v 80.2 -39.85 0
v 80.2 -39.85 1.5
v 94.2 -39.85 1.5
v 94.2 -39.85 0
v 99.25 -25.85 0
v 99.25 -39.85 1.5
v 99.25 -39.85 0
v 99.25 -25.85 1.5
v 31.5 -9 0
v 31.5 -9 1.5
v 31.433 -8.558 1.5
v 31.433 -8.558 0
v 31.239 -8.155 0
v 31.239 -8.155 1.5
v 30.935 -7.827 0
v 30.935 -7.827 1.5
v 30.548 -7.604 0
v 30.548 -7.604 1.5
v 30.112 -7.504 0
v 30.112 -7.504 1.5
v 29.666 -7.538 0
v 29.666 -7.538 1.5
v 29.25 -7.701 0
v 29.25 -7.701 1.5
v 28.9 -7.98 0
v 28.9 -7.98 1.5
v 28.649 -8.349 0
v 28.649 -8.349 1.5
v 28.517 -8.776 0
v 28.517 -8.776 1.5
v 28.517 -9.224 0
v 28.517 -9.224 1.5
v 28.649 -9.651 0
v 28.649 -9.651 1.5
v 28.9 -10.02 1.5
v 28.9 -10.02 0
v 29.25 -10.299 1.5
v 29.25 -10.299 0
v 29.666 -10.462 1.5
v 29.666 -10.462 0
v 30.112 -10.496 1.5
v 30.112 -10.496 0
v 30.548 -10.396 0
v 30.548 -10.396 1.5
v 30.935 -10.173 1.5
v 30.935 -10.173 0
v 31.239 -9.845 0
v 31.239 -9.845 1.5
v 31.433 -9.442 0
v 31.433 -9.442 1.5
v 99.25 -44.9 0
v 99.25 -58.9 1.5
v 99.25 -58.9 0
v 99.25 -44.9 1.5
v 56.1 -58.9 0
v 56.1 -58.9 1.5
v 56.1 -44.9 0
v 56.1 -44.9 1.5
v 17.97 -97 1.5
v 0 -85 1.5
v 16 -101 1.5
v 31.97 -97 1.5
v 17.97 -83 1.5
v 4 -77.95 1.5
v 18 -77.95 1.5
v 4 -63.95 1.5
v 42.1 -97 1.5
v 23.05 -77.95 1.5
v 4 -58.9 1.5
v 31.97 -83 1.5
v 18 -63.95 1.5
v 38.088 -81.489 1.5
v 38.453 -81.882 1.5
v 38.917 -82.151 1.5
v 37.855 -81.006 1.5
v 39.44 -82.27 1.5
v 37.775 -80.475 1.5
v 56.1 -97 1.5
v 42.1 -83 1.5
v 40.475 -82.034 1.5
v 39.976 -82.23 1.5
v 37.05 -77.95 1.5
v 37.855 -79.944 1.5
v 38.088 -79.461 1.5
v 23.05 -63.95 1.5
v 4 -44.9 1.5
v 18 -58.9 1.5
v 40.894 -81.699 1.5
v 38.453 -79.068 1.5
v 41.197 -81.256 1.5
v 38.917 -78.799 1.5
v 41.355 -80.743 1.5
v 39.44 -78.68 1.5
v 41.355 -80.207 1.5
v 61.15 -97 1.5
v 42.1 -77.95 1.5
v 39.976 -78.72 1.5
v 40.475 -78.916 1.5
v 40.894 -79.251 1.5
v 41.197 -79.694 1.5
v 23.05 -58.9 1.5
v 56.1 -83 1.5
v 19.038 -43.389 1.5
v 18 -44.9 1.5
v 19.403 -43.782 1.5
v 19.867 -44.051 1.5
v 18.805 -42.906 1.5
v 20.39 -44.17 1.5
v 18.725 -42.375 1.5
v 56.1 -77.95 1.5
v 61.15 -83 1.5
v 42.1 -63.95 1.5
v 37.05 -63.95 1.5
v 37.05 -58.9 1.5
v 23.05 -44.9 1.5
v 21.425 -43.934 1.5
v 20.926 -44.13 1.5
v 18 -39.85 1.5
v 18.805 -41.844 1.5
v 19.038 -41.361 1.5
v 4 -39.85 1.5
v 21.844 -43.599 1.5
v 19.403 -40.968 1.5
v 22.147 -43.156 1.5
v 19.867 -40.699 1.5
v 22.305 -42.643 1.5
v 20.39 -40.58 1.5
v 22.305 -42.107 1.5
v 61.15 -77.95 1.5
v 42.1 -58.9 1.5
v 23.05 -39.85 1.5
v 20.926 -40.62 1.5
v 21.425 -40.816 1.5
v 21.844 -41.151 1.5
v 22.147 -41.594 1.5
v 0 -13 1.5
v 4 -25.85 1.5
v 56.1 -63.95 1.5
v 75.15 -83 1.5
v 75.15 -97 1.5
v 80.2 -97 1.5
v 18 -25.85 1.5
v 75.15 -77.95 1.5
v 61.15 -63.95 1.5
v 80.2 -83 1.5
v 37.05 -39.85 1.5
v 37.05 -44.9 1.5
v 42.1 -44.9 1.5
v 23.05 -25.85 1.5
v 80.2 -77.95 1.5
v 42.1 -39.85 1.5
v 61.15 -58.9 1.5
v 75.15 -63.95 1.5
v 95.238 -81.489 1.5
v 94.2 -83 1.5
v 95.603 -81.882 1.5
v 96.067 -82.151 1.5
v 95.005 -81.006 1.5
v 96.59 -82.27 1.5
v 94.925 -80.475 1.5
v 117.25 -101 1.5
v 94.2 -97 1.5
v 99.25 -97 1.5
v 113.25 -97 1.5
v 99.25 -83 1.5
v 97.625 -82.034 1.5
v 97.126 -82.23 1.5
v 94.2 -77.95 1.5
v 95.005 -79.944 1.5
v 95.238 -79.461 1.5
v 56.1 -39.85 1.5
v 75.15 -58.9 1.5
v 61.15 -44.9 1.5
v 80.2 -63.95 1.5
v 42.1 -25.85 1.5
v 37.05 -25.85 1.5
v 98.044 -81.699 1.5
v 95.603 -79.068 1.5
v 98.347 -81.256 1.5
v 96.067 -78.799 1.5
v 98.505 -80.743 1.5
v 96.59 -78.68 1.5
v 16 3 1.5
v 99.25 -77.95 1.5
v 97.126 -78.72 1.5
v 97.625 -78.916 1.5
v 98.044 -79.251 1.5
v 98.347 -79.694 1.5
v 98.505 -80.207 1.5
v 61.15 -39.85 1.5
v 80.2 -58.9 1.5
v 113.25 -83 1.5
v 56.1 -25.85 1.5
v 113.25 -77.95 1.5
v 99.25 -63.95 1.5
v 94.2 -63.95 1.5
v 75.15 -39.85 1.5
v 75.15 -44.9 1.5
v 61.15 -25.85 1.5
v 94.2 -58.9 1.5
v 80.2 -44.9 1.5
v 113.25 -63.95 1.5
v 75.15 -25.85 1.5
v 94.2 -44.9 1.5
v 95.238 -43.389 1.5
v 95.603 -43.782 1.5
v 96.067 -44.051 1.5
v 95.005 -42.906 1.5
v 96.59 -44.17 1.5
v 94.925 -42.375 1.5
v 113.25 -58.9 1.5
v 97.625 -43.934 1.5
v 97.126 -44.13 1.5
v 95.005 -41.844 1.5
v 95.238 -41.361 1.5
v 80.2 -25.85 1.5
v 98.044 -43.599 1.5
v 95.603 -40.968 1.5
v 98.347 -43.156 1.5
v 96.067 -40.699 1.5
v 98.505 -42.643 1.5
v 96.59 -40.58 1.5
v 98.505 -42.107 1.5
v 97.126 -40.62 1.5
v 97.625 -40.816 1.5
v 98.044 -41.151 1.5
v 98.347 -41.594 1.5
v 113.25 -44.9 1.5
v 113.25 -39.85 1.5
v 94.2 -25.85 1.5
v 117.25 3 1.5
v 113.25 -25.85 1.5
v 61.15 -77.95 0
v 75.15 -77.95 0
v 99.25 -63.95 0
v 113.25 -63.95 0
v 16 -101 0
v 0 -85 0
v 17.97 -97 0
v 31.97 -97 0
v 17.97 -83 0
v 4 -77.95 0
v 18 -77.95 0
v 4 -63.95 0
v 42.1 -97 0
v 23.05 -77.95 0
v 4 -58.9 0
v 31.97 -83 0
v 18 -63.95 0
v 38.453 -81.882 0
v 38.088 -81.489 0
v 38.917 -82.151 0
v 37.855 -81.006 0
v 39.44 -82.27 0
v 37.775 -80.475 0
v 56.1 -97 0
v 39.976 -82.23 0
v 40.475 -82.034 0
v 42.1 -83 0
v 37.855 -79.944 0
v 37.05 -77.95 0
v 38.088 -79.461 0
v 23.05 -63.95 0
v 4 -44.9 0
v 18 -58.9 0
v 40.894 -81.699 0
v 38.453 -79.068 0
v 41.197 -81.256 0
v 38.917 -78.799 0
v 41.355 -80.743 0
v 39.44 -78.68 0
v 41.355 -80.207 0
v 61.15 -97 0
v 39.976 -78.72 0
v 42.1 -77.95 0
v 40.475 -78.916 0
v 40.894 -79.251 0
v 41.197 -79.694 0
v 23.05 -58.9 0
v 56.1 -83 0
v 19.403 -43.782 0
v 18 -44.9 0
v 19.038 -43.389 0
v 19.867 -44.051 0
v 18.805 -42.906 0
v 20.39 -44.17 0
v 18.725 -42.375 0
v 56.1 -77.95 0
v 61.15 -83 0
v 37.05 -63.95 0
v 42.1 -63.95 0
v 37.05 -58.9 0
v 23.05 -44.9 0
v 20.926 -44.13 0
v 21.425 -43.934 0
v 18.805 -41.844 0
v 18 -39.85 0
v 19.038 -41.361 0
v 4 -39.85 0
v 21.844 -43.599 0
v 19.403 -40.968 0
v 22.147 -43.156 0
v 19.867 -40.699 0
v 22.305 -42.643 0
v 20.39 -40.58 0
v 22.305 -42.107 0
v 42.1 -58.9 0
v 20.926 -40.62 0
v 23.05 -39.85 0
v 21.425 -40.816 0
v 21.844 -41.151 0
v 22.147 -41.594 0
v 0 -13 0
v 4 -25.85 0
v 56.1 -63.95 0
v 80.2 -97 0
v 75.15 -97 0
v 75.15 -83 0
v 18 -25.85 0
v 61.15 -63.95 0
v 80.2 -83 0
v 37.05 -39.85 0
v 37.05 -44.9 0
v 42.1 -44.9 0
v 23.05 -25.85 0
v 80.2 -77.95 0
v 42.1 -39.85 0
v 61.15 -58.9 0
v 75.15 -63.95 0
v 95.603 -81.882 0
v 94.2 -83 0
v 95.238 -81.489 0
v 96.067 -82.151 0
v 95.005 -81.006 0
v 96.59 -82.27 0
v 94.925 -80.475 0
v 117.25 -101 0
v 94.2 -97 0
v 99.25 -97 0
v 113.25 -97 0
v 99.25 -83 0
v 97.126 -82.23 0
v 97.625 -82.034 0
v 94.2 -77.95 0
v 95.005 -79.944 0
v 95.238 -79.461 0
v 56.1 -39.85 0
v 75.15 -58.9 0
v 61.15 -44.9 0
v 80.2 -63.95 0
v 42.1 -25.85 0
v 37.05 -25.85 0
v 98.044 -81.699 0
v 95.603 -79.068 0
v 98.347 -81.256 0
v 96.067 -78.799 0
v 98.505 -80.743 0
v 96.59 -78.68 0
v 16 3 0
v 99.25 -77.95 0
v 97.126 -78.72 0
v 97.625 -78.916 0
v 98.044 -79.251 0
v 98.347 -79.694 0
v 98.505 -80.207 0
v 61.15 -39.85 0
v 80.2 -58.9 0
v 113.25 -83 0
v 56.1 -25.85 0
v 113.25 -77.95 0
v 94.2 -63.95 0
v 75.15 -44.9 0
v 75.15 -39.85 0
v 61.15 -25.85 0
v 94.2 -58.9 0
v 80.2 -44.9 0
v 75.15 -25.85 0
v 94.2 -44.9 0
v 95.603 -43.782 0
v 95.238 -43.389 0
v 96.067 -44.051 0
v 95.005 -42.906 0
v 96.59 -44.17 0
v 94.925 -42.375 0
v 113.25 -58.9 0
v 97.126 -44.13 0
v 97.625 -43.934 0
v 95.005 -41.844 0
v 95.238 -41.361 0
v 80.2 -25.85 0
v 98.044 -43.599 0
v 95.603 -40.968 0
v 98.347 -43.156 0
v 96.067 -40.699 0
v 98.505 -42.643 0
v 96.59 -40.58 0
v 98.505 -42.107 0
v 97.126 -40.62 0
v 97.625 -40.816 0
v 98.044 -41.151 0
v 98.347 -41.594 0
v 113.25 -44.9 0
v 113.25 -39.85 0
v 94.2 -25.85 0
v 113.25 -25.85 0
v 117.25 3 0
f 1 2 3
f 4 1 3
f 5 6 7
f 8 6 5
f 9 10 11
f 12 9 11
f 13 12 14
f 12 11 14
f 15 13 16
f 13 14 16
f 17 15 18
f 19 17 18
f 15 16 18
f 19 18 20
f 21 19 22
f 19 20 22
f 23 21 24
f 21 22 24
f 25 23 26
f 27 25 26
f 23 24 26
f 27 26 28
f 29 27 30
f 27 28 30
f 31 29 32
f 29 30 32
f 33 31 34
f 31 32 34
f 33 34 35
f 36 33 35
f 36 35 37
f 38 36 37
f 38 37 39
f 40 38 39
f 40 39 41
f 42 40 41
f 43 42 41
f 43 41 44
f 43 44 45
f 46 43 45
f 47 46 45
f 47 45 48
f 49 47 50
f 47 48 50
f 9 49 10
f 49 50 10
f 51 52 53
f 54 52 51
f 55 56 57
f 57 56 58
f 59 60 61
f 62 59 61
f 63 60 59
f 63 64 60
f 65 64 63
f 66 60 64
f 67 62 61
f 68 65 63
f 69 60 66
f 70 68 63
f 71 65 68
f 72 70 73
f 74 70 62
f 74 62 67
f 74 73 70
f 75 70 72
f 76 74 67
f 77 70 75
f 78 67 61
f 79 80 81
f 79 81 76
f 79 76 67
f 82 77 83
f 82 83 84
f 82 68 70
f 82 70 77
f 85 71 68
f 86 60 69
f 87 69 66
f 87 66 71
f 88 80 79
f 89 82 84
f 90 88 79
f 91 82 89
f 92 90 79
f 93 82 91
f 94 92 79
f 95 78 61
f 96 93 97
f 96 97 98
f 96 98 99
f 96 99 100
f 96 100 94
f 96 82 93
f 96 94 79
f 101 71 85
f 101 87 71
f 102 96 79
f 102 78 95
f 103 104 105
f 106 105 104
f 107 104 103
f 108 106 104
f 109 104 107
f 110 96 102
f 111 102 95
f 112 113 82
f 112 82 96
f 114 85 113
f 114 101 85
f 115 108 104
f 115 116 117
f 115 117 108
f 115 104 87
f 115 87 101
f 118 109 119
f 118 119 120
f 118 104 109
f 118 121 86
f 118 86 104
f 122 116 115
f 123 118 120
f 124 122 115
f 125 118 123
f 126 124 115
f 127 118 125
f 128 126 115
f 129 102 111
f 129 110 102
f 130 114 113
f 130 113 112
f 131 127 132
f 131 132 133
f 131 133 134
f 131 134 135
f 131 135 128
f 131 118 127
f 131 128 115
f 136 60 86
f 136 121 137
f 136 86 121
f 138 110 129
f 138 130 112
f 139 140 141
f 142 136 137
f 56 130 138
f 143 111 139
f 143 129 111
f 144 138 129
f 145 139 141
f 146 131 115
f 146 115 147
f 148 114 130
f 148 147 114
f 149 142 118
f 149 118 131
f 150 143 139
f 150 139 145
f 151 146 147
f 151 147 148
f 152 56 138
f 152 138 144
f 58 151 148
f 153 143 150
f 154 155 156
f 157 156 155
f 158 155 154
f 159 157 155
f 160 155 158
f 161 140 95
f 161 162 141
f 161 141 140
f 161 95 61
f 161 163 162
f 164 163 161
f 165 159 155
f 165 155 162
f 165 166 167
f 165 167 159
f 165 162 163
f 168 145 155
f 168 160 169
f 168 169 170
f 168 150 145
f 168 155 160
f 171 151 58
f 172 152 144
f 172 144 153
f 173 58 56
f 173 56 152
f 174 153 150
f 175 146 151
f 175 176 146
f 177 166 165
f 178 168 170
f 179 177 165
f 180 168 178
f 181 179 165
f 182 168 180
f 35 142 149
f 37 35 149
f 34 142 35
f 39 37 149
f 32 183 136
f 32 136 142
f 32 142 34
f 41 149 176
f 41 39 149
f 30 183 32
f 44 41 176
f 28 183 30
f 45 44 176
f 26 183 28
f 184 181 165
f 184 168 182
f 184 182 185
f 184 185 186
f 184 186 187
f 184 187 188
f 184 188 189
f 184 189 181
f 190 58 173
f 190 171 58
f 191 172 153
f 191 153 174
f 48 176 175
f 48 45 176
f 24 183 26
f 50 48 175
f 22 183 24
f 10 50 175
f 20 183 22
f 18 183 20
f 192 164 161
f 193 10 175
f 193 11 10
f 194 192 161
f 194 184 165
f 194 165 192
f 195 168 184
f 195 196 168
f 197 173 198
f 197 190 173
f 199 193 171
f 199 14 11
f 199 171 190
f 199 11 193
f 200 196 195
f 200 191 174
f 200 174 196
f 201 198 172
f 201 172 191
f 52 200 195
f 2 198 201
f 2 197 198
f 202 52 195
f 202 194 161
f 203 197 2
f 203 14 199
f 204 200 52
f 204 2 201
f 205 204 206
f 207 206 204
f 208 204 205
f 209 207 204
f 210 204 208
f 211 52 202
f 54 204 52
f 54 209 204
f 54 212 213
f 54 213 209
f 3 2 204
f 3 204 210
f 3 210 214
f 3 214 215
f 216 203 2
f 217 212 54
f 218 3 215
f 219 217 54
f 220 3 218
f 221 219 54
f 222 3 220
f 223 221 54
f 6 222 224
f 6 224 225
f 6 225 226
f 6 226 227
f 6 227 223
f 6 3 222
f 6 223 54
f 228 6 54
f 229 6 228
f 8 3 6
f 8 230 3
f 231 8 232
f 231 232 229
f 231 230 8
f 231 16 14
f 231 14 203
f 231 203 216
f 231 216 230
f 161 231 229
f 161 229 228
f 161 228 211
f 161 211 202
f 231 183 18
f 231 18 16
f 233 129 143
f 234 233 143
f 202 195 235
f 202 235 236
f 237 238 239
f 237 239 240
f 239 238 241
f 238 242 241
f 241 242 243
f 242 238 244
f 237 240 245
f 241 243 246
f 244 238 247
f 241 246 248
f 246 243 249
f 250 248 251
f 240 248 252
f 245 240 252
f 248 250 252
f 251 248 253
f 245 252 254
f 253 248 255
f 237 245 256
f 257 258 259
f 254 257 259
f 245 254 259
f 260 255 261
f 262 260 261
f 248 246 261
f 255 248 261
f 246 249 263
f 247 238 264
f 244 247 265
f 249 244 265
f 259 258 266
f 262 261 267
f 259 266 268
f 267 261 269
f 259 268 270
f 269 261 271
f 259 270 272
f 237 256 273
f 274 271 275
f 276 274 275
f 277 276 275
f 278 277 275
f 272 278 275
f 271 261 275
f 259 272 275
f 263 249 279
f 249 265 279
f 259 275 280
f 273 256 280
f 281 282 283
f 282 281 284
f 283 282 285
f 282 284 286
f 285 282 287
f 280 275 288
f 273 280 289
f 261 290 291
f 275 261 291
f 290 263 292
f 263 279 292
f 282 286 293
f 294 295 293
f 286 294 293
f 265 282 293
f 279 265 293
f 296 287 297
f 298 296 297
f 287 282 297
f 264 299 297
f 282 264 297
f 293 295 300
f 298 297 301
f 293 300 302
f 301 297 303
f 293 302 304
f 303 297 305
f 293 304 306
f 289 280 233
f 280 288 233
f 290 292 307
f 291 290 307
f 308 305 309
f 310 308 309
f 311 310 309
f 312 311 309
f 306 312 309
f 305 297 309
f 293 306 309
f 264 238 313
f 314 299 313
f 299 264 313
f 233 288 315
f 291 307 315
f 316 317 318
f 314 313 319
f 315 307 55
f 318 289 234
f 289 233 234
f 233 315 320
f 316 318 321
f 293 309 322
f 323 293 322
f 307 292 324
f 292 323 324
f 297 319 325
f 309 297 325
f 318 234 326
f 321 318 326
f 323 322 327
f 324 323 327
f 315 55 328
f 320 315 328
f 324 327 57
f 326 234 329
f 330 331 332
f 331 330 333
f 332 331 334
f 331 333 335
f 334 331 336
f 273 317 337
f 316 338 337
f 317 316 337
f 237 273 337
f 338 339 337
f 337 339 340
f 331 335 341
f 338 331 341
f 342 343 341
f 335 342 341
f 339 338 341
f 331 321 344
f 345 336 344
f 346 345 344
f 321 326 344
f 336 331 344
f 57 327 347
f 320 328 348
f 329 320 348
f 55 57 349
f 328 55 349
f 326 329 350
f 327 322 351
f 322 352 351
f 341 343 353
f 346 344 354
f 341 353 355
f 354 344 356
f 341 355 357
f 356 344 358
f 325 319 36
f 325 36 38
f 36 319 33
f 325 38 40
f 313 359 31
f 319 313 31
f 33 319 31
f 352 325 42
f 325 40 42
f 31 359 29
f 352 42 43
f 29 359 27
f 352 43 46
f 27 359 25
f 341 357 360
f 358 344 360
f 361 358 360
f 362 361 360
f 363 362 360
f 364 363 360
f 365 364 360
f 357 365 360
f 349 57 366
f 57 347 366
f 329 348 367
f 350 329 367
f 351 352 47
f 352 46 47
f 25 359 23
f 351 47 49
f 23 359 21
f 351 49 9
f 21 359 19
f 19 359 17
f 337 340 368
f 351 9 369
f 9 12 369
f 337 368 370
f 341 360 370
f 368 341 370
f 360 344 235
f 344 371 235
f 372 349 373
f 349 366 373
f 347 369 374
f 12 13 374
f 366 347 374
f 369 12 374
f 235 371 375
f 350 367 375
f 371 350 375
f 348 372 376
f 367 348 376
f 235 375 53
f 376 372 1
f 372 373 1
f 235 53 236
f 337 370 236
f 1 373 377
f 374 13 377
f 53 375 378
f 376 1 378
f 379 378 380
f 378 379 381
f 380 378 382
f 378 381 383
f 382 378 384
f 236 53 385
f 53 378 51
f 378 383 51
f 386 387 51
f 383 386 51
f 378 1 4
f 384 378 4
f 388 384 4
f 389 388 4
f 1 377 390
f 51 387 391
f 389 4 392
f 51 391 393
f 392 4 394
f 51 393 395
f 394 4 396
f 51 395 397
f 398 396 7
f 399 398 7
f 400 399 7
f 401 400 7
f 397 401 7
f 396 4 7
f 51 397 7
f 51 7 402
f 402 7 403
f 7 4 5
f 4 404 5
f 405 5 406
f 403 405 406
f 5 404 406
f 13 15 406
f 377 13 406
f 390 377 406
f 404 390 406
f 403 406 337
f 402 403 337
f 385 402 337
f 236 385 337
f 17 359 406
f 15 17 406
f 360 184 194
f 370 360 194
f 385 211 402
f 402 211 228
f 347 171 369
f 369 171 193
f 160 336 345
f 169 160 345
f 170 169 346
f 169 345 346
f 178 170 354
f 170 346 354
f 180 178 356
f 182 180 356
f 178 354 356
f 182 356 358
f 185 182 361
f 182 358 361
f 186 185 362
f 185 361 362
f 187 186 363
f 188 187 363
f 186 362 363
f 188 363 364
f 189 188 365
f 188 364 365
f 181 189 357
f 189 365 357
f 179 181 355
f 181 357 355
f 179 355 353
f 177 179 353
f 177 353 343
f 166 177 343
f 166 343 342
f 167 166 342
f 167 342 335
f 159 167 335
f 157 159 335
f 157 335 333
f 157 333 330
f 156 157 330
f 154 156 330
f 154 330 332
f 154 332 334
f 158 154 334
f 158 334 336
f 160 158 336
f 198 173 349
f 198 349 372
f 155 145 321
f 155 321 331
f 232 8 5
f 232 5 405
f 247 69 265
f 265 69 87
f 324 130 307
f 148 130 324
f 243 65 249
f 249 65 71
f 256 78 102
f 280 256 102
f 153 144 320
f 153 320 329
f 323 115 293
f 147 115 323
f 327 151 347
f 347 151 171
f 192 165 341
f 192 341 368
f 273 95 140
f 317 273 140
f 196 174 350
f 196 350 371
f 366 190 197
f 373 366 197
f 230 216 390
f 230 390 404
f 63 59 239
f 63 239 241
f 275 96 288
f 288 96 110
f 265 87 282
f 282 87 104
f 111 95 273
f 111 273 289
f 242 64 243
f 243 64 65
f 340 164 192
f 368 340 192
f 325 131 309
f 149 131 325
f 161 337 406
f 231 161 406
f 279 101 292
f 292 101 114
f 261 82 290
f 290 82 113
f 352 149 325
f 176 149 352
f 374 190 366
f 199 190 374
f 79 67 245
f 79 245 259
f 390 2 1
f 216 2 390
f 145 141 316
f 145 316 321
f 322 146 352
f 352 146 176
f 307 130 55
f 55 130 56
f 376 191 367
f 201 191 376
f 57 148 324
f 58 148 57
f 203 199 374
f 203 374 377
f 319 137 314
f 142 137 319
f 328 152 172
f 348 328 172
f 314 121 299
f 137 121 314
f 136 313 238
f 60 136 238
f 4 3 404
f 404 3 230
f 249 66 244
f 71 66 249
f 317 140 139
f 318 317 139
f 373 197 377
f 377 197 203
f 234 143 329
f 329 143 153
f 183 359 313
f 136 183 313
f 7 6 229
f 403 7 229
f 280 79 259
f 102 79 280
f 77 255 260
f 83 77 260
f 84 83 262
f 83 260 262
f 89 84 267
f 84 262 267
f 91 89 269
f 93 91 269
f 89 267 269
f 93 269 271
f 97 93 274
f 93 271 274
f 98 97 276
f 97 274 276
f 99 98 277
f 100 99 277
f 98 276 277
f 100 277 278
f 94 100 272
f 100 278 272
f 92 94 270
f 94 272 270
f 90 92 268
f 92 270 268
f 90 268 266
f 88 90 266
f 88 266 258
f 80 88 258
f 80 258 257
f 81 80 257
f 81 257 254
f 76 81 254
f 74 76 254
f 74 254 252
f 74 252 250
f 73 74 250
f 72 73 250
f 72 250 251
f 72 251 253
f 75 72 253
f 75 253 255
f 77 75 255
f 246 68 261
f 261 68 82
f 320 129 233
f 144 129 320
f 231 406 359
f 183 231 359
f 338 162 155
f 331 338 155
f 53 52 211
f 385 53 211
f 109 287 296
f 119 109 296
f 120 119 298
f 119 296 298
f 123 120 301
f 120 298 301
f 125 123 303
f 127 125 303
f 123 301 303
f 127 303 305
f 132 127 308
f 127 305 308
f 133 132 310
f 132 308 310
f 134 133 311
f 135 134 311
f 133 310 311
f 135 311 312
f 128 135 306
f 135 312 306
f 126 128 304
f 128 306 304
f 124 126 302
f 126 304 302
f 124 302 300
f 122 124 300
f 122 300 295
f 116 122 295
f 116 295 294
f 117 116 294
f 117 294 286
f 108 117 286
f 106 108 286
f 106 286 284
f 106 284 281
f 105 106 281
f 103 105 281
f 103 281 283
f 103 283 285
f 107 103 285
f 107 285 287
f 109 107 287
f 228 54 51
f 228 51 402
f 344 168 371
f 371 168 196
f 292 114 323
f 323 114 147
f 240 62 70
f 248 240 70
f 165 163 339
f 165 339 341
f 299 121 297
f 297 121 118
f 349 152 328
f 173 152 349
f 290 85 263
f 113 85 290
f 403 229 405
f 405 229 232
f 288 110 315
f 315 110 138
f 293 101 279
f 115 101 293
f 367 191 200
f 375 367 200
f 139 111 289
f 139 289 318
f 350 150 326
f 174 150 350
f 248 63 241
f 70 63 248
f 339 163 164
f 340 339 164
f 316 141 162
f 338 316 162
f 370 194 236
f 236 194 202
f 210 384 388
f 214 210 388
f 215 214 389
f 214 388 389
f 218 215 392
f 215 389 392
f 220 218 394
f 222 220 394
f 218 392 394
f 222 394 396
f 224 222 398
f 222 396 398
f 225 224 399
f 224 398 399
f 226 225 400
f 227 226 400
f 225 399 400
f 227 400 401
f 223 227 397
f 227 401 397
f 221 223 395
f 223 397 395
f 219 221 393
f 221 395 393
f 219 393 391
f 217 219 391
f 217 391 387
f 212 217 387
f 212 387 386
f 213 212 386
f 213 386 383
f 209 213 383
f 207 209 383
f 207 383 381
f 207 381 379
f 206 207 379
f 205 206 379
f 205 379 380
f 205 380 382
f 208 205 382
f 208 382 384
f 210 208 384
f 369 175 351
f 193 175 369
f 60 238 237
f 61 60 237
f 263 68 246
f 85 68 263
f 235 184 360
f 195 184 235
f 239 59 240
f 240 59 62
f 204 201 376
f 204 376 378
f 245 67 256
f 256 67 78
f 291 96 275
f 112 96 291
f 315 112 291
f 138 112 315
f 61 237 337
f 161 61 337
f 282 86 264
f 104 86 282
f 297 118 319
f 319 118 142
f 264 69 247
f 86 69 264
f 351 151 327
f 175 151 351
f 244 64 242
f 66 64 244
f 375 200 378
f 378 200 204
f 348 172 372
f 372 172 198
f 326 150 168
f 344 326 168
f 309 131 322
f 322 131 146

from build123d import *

# Parameters (mm, degrees)
BOSS_EXTRU_1_DEPTH      = 1.5
ESQUISSE2_R             = 1.5
ESQUISSE2_W             = 14
ESQUISSE2_H             = 14
ENL_V_MAT_EXTRU_1_DEPTH = 1.5
D_GAGEMENT_M31_D        = 3.6


with BuildPart() as part:
    # Esquisse1 → Boss.-Extru.1 (new body)
    with BuildSketch(Plane.XY):
        Polygon((0, -85), (16, -101), (117.25, -101), (117.25, 3), (16, 3), (0, -13), align=None)
    extrude(amount=BOSS_EXTRU_1_DEPTH)

    # Esquisse2 → Enlèv. mat.-Extru.1 (cut)
    with BuildSketch(Plane.XY.offset(1.5)):
        with Locations((30, -9)):
            Circle(ESQUISSE2_R)
        with Locations((11, -32.85)):
            Rectangle(ESQUISSE2_W, ESQUISSE2_H)
        with Locations((30.05, -32.85)):
            Rectangle(ESQUISSE2_W, ESQUISSE2_H)
        with Locations((49.1, -32.85)):
            Rectangle(ESQUISSE2_W, ESQUISSE2_H)
        with Locations((68.15, -32.85)):
            Rectangle(ESQUISSE2_W, ESQUISSE2_H)
        with Locations((87.2, -32.85)):
            Rectangle(ESQUISSE2_W, ESQUISSE2_H)
        with Locations((106.25, -32.85)):
            Rectangle(ESQUISSE2_W, ESQUISSE2_H)
        with Locations((30.05, -51.9)):
            Rectangle(ESQUISSE2_W, ESQUISSE2_H)
        with Locations((49.1, -51.9)):
            Rectangle(ESQUISSE2_W, ESQUISSE2_H)
        with Locations((68.15, -51.9)):
            Rectangle(ESQUISSE2_W, ESQUISSE2_H)
        with Locations((87.2, -51.9)):
            Rectangle(ESQUISSE2_W, ESQUISSE2_H)
        with Locations((106.25, -51.9)):
            Rectangle(ESQUISSE2_W, ESQUISSE2_H)
        with Locations((30.05, -70.95)):
            Rectangle(ESQUISSE2_W, ESQUISSE2_H)
        with Locations((49.1, -70.95)):
            Rectangle(ESQUISSE2_W, ESQUISSE2_H)
        with Locations((68.15, -70.95)):
            Rectangle(ESQUISSE2_W, ESQUISSE2_H)
        with Locations((87.2, -70.95)):
            Rectangle(ESQUISSE2_W, ESQUISSE2_H)
        with Locations((106.25, -70.95)):
            Rectangle(ESQUISSE2_W, ESQUISSE2_H)
        with Locations((11, -51.9)):
            Rectangle(ESQUISSE2_W, ESQUISSE2_H)
        with Locations((11, -70.95)):
            Rectangle(ESQUISSE2_W, ESQUISSE2_H)
        with Locations((49.1, -90)):
            Rectangle(ESQUISSE2_W, ESQUISSE2_H)
        with Locations((68.15, -90)):
            Rectangle(ESQUISSE2_W, ESQUISSE2_H)
        with Locations((87.2, -90)):
            Rectangle(ESQUISSE2_W, ESQUISSE2_H)
        with Locations((106.25, -90)):
            Rectangle(ESQUISSE2_W, ESQUISSE2_H)
        with Locations((24.97, -90)):
            Rectangle(ESQUISSE2_W, ESQUISSE2_H)
    extrude(amount=-ENL_V_MAT_EXTRU_1_DEPTH, mode=Mode.SUBTRACT)

    # Dégagement M31 (through all)
    with Locations(Plane.XY.offset(1.5)):
        with Locations((20.525, -42.375), (96.725, -42.375), (96.725, -80.475), (39.575, -80.475)):
            Hole(D_GAGEMENT_M31_D / 2)


solid = part.part
